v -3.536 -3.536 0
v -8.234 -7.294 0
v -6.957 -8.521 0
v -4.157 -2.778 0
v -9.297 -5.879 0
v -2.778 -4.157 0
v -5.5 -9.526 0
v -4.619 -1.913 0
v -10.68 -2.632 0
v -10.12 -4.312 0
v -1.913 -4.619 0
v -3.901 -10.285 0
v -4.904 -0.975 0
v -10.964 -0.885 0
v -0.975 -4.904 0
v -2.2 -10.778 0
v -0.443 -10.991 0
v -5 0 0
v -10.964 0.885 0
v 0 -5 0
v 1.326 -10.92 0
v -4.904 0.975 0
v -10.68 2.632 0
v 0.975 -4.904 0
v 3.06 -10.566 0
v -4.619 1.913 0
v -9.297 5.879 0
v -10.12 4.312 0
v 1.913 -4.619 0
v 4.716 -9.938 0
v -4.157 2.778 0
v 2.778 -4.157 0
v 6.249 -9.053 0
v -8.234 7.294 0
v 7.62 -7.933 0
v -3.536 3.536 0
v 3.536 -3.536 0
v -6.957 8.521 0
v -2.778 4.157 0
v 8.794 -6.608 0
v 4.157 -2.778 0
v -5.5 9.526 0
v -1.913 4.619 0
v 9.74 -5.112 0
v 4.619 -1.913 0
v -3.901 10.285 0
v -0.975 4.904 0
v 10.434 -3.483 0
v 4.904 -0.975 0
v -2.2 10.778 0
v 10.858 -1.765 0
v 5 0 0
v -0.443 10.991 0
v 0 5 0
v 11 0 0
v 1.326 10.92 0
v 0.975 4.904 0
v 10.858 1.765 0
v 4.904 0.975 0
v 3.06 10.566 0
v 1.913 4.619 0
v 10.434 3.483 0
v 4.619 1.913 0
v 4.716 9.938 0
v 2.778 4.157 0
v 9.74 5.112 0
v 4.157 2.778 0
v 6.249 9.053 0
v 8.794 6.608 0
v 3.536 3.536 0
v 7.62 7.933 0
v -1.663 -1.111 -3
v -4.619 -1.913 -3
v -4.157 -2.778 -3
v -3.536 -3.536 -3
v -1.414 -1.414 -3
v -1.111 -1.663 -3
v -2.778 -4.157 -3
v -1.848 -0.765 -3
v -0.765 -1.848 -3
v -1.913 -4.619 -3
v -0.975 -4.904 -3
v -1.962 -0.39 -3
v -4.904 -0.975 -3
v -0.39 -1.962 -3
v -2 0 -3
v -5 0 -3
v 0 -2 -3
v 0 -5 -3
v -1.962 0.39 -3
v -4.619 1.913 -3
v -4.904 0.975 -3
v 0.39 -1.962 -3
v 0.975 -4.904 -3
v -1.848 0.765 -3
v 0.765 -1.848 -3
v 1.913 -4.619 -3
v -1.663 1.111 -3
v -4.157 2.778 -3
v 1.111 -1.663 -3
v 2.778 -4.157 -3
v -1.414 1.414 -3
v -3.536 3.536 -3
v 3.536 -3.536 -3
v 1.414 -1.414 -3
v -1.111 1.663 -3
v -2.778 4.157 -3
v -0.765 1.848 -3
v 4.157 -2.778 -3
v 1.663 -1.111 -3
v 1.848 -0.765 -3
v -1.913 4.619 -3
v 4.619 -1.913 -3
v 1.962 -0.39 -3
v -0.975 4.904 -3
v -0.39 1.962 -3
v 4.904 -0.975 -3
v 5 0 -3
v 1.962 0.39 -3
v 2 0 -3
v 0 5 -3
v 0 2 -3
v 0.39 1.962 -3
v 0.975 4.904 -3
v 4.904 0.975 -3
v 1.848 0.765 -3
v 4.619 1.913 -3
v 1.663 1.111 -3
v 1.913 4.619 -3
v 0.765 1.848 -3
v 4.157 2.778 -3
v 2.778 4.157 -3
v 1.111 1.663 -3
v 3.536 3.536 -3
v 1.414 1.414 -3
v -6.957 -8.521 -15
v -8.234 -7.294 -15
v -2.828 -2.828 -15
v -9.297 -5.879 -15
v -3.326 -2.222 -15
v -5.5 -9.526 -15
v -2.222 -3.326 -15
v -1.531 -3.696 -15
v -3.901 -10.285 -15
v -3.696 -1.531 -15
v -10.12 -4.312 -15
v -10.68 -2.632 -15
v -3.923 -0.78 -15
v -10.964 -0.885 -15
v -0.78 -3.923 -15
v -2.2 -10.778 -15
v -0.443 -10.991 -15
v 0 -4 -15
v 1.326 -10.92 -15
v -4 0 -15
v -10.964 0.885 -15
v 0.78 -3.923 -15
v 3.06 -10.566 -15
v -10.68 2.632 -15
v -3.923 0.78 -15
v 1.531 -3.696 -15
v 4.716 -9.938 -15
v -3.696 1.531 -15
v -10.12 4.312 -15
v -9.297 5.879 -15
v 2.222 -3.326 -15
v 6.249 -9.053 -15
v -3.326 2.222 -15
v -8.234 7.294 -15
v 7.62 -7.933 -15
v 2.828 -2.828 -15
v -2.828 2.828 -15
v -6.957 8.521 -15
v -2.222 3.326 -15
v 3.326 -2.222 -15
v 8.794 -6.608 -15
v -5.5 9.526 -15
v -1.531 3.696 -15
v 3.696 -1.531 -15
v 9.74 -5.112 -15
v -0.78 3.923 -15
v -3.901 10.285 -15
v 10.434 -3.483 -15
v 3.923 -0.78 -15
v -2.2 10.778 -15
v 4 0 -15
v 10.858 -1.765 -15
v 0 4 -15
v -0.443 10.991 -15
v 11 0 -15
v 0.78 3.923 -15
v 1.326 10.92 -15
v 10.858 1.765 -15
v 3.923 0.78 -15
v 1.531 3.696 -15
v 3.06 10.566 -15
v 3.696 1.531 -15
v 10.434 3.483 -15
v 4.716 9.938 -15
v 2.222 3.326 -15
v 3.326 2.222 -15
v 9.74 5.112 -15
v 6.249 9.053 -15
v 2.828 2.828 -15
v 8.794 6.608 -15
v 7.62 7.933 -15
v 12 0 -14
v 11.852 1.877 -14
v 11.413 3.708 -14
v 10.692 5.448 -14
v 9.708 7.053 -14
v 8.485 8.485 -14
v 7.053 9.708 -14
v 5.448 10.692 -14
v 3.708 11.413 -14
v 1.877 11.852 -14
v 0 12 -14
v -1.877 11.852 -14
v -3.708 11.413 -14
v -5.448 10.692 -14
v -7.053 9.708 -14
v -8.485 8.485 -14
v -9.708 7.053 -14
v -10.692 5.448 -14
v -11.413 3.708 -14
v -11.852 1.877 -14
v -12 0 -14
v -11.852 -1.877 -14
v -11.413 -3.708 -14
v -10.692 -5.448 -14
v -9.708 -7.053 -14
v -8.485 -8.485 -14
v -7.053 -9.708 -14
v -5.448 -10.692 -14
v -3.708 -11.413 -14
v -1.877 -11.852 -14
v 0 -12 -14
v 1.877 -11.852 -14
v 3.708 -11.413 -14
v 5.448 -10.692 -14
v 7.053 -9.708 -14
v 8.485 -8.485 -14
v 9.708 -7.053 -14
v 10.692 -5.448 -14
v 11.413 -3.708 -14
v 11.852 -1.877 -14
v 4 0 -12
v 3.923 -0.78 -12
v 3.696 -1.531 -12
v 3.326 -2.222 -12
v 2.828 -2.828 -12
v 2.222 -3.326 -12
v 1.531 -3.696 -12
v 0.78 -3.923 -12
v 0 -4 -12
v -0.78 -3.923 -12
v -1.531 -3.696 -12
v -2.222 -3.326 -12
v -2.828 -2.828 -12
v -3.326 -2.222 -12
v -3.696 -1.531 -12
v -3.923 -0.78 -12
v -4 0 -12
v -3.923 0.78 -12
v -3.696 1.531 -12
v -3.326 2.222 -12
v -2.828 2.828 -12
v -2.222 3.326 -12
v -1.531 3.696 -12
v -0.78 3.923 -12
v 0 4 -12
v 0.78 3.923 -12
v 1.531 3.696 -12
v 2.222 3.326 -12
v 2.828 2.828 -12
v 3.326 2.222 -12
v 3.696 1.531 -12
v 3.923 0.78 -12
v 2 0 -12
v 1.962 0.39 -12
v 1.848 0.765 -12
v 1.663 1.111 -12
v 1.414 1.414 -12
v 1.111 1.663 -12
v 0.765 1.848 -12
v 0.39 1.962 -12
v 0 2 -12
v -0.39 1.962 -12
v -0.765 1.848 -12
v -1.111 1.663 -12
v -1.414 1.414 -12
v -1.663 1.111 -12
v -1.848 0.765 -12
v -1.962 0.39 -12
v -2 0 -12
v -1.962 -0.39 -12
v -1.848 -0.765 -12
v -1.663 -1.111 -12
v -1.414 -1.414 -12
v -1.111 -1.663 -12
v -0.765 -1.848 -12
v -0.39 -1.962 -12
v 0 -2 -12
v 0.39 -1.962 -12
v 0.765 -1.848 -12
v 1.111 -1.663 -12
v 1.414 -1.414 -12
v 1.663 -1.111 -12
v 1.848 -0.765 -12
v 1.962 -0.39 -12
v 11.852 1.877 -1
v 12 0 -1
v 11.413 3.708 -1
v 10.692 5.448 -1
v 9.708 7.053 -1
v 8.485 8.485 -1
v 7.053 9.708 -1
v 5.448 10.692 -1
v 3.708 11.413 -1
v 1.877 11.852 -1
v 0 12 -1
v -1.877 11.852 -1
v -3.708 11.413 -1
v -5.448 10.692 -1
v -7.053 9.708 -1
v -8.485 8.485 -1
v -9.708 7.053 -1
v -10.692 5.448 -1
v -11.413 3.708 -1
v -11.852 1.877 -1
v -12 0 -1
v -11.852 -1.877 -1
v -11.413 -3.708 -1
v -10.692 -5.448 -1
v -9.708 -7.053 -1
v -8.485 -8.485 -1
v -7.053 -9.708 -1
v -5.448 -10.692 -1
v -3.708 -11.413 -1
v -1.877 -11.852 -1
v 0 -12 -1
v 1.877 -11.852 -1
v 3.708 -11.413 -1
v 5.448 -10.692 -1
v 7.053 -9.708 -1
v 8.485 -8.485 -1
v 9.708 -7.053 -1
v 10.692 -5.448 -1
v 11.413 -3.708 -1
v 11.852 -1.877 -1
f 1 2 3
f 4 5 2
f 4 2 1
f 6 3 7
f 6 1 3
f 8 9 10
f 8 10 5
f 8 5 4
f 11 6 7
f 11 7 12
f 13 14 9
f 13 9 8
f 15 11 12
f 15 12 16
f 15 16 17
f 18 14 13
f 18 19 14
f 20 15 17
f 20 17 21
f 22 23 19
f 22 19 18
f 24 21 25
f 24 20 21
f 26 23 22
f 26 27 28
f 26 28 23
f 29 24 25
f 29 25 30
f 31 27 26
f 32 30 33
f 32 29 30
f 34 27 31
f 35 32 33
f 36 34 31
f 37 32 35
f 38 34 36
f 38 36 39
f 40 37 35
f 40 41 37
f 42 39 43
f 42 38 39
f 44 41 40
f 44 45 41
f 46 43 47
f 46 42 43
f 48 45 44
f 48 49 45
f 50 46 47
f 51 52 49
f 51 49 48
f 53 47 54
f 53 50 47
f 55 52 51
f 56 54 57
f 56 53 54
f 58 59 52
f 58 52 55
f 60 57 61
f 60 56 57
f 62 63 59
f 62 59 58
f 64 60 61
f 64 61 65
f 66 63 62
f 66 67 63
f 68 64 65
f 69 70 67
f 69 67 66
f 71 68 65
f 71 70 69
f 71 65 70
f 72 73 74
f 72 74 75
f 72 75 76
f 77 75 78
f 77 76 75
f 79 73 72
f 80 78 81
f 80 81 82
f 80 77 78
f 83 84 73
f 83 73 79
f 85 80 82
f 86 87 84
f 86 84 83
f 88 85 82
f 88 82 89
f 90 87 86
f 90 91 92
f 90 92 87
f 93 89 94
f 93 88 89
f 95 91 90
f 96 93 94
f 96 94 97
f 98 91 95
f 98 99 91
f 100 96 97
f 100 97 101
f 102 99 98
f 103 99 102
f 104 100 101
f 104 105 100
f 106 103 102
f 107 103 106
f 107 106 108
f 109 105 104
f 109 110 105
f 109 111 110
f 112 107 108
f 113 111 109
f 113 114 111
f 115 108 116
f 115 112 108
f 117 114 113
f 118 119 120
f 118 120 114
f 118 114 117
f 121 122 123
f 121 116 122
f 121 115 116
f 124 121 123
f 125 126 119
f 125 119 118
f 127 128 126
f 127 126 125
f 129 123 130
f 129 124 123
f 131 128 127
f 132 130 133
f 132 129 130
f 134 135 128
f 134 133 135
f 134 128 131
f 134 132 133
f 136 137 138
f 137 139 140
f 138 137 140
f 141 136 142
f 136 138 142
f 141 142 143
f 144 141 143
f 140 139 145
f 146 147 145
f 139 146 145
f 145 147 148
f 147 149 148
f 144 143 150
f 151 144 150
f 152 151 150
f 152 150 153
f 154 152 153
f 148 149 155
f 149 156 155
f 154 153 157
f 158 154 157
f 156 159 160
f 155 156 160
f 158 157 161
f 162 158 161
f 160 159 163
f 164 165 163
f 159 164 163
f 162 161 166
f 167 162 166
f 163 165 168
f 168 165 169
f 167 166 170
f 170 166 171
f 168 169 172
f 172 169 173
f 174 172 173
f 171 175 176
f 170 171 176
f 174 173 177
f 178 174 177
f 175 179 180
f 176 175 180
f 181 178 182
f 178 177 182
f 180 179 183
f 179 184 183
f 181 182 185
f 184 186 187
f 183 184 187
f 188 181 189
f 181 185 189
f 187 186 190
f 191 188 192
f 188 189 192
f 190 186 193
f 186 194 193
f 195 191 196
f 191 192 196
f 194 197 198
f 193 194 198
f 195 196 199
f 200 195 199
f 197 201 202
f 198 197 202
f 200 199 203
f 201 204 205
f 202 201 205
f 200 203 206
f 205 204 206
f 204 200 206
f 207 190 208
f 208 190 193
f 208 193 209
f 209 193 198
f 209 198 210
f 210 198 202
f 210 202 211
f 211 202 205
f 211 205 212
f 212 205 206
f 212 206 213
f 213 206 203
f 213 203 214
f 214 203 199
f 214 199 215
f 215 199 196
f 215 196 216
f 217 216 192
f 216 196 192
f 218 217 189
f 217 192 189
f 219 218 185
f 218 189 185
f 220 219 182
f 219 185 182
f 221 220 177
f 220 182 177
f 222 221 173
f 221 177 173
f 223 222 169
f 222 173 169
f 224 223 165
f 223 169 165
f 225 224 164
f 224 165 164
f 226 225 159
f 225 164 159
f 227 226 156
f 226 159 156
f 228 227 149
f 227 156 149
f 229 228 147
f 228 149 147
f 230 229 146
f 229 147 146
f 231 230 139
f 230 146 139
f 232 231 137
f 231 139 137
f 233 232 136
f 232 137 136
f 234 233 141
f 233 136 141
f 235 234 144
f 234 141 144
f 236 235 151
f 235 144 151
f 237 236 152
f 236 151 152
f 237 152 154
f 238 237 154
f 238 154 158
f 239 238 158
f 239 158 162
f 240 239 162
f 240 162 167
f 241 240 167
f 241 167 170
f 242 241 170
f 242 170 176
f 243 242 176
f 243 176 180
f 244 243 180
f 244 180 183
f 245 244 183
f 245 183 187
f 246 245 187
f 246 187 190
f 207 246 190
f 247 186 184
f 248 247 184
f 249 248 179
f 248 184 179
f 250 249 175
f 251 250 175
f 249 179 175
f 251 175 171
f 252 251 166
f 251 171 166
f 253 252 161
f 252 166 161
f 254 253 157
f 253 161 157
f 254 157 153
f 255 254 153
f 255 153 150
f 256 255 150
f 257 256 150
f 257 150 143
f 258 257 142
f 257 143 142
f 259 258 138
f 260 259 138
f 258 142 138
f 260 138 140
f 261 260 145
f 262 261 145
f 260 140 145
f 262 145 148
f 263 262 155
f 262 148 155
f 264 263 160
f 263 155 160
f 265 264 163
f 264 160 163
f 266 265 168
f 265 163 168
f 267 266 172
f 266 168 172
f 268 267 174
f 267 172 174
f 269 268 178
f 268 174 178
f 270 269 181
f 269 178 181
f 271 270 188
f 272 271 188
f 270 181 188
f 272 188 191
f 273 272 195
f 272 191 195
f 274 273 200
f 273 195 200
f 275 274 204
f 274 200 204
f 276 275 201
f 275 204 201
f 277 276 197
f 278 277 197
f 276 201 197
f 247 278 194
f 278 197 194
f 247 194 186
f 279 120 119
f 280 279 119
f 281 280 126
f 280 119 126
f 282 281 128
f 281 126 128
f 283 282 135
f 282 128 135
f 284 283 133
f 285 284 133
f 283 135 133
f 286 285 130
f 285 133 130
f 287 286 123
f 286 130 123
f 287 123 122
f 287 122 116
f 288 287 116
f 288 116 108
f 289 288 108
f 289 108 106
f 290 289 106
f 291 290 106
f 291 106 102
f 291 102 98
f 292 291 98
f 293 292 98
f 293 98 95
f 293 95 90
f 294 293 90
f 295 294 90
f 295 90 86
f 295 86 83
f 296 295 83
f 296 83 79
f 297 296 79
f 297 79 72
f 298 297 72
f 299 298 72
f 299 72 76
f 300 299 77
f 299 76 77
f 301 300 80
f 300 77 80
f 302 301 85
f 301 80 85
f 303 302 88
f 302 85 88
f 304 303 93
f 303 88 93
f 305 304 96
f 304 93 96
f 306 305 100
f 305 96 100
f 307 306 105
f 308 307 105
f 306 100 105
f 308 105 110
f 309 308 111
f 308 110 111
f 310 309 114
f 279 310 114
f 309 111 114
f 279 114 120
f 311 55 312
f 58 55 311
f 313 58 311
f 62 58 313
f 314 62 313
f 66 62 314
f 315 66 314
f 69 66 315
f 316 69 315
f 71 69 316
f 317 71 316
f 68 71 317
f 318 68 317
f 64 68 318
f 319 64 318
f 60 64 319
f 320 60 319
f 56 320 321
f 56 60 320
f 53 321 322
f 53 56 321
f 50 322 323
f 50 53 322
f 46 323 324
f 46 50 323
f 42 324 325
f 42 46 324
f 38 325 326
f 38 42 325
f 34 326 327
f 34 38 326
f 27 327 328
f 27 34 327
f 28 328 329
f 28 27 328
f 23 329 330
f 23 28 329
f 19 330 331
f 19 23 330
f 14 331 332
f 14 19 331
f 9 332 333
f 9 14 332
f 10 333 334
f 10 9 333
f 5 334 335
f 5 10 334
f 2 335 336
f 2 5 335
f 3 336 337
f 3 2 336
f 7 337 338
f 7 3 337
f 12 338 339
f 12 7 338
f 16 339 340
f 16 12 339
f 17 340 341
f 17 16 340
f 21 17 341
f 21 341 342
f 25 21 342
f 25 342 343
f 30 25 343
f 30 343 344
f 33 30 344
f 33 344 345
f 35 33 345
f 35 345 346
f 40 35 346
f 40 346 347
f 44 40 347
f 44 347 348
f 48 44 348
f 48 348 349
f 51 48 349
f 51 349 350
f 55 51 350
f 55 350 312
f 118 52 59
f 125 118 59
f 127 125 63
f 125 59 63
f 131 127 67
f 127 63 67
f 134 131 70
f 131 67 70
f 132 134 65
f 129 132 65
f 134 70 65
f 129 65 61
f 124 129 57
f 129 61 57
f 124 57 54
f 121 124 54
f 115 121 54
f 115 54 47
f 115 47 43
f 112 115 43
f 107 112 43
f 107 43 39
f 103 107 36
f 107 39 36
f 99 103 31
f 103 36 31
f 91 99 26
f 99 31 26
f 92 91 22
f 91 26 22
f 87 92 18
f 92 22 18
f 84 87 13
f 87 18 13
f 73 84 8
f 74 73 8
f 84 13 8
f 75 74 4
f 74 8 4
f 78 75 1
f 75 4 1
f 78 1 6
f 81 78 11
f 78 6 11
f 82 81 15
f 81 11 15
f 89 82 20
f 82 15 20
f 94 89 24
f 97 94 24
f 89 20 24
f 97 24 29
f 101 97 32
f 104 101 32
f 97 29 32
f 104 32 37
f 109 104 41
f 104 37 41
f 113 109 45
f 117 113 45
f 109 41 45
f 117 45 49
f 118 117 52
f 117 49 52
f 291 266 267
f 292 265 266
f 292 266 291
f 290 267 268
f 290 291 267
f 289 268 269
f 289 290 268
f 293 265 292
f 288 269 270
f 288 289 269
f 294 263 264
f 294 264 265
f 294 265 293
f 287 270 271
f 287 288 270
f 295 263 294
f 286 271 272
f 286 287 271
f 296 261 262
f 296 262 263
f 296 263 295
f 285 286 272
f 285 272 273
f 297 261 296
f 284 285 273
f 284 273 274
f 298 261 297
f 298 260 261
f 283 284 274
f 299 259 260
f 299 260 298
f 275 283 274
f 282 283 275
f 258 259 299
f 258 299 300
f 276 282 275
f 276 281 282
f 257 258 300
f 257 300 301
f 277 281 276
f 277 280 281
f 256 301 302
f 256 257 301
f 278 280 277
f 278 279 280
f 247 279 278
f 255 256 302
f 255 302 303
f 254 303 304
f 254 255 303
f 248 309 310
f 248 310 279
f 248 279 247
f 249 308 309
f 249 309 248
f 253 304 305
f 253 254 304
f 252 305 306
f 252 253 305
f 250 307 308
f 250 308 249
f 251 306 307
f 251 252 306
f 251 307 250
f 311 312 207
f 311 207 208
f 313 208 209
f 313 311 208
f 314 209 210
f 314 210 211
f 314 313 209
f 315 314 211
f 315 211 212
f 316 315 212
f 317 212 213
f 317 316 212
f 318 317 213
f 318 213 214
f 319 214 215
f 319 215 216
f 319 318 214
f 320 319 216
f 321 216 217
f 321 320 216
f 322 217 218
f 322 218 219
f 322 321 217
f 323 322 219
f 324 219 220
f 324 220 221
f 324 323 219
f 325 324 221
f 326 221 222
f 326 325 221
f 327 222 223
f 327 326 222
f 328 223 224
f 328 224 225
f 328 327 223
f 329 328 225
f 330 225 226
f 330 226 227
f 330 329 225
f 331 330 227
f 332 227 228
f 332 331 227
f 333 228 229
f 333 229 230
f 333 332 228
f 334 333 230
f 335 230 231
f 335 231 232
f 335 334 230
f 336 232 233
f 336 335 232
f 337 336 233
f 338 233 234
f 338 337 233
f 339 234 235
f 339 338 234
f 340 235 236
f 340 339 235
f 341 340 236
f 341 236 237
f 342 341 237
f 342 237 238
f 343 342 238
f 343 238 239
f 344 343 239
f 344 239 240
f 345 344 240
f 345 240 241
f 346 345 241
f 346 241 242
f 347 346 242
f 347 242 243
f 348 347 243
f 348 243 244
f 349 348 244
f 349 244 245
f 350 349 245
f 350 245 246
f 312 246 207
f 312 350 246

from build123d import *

# Parameters (mm, degrees)
F0_R     = 12
F0_R_2   = 2
F1_DEPTH = 15
F2_SIZE  = 1
F3_R     = 5
F4_DEPTH = 3
F5_R     = 4
F6_DEPTH = 3


with BuildPart() as f1:
    # F0 (on Top) → F1 (new body)
    with BuildSketch(Plane.XY):
        Circle(F0_R)
        Circle(F0_R_2, mode=Mode.SUBTRACT)
    extrude(amount=-F1_DEPTH)

    # F2
    f2_edges = [f1.edges().sort_by_distance(p)[0] for p in [
        (-12, 0, -15),
        (-12, 0, 0),
    ]]
    chamfer(f2_edges, length=F2_SIZE)

    # F3 (on face) → F4 (cut)
    with BuildSketch(Plane.XY):
        Circle(F3_R)
    extrude(amount=-F4_DEPTH, mode=Mode.SUBTRACT)

    # F5 (on face) → F6 (cut)
    with BuildSketch(Plane(origin=(0, 0, -15), x_dir=(1, 0, 0), z_dir=(0, 0, -1))):
        Circle(F5_R)
    extrude(amount=-F6_DEPTH, mode=Mode.SUBTRACT)


solid = f1.part
